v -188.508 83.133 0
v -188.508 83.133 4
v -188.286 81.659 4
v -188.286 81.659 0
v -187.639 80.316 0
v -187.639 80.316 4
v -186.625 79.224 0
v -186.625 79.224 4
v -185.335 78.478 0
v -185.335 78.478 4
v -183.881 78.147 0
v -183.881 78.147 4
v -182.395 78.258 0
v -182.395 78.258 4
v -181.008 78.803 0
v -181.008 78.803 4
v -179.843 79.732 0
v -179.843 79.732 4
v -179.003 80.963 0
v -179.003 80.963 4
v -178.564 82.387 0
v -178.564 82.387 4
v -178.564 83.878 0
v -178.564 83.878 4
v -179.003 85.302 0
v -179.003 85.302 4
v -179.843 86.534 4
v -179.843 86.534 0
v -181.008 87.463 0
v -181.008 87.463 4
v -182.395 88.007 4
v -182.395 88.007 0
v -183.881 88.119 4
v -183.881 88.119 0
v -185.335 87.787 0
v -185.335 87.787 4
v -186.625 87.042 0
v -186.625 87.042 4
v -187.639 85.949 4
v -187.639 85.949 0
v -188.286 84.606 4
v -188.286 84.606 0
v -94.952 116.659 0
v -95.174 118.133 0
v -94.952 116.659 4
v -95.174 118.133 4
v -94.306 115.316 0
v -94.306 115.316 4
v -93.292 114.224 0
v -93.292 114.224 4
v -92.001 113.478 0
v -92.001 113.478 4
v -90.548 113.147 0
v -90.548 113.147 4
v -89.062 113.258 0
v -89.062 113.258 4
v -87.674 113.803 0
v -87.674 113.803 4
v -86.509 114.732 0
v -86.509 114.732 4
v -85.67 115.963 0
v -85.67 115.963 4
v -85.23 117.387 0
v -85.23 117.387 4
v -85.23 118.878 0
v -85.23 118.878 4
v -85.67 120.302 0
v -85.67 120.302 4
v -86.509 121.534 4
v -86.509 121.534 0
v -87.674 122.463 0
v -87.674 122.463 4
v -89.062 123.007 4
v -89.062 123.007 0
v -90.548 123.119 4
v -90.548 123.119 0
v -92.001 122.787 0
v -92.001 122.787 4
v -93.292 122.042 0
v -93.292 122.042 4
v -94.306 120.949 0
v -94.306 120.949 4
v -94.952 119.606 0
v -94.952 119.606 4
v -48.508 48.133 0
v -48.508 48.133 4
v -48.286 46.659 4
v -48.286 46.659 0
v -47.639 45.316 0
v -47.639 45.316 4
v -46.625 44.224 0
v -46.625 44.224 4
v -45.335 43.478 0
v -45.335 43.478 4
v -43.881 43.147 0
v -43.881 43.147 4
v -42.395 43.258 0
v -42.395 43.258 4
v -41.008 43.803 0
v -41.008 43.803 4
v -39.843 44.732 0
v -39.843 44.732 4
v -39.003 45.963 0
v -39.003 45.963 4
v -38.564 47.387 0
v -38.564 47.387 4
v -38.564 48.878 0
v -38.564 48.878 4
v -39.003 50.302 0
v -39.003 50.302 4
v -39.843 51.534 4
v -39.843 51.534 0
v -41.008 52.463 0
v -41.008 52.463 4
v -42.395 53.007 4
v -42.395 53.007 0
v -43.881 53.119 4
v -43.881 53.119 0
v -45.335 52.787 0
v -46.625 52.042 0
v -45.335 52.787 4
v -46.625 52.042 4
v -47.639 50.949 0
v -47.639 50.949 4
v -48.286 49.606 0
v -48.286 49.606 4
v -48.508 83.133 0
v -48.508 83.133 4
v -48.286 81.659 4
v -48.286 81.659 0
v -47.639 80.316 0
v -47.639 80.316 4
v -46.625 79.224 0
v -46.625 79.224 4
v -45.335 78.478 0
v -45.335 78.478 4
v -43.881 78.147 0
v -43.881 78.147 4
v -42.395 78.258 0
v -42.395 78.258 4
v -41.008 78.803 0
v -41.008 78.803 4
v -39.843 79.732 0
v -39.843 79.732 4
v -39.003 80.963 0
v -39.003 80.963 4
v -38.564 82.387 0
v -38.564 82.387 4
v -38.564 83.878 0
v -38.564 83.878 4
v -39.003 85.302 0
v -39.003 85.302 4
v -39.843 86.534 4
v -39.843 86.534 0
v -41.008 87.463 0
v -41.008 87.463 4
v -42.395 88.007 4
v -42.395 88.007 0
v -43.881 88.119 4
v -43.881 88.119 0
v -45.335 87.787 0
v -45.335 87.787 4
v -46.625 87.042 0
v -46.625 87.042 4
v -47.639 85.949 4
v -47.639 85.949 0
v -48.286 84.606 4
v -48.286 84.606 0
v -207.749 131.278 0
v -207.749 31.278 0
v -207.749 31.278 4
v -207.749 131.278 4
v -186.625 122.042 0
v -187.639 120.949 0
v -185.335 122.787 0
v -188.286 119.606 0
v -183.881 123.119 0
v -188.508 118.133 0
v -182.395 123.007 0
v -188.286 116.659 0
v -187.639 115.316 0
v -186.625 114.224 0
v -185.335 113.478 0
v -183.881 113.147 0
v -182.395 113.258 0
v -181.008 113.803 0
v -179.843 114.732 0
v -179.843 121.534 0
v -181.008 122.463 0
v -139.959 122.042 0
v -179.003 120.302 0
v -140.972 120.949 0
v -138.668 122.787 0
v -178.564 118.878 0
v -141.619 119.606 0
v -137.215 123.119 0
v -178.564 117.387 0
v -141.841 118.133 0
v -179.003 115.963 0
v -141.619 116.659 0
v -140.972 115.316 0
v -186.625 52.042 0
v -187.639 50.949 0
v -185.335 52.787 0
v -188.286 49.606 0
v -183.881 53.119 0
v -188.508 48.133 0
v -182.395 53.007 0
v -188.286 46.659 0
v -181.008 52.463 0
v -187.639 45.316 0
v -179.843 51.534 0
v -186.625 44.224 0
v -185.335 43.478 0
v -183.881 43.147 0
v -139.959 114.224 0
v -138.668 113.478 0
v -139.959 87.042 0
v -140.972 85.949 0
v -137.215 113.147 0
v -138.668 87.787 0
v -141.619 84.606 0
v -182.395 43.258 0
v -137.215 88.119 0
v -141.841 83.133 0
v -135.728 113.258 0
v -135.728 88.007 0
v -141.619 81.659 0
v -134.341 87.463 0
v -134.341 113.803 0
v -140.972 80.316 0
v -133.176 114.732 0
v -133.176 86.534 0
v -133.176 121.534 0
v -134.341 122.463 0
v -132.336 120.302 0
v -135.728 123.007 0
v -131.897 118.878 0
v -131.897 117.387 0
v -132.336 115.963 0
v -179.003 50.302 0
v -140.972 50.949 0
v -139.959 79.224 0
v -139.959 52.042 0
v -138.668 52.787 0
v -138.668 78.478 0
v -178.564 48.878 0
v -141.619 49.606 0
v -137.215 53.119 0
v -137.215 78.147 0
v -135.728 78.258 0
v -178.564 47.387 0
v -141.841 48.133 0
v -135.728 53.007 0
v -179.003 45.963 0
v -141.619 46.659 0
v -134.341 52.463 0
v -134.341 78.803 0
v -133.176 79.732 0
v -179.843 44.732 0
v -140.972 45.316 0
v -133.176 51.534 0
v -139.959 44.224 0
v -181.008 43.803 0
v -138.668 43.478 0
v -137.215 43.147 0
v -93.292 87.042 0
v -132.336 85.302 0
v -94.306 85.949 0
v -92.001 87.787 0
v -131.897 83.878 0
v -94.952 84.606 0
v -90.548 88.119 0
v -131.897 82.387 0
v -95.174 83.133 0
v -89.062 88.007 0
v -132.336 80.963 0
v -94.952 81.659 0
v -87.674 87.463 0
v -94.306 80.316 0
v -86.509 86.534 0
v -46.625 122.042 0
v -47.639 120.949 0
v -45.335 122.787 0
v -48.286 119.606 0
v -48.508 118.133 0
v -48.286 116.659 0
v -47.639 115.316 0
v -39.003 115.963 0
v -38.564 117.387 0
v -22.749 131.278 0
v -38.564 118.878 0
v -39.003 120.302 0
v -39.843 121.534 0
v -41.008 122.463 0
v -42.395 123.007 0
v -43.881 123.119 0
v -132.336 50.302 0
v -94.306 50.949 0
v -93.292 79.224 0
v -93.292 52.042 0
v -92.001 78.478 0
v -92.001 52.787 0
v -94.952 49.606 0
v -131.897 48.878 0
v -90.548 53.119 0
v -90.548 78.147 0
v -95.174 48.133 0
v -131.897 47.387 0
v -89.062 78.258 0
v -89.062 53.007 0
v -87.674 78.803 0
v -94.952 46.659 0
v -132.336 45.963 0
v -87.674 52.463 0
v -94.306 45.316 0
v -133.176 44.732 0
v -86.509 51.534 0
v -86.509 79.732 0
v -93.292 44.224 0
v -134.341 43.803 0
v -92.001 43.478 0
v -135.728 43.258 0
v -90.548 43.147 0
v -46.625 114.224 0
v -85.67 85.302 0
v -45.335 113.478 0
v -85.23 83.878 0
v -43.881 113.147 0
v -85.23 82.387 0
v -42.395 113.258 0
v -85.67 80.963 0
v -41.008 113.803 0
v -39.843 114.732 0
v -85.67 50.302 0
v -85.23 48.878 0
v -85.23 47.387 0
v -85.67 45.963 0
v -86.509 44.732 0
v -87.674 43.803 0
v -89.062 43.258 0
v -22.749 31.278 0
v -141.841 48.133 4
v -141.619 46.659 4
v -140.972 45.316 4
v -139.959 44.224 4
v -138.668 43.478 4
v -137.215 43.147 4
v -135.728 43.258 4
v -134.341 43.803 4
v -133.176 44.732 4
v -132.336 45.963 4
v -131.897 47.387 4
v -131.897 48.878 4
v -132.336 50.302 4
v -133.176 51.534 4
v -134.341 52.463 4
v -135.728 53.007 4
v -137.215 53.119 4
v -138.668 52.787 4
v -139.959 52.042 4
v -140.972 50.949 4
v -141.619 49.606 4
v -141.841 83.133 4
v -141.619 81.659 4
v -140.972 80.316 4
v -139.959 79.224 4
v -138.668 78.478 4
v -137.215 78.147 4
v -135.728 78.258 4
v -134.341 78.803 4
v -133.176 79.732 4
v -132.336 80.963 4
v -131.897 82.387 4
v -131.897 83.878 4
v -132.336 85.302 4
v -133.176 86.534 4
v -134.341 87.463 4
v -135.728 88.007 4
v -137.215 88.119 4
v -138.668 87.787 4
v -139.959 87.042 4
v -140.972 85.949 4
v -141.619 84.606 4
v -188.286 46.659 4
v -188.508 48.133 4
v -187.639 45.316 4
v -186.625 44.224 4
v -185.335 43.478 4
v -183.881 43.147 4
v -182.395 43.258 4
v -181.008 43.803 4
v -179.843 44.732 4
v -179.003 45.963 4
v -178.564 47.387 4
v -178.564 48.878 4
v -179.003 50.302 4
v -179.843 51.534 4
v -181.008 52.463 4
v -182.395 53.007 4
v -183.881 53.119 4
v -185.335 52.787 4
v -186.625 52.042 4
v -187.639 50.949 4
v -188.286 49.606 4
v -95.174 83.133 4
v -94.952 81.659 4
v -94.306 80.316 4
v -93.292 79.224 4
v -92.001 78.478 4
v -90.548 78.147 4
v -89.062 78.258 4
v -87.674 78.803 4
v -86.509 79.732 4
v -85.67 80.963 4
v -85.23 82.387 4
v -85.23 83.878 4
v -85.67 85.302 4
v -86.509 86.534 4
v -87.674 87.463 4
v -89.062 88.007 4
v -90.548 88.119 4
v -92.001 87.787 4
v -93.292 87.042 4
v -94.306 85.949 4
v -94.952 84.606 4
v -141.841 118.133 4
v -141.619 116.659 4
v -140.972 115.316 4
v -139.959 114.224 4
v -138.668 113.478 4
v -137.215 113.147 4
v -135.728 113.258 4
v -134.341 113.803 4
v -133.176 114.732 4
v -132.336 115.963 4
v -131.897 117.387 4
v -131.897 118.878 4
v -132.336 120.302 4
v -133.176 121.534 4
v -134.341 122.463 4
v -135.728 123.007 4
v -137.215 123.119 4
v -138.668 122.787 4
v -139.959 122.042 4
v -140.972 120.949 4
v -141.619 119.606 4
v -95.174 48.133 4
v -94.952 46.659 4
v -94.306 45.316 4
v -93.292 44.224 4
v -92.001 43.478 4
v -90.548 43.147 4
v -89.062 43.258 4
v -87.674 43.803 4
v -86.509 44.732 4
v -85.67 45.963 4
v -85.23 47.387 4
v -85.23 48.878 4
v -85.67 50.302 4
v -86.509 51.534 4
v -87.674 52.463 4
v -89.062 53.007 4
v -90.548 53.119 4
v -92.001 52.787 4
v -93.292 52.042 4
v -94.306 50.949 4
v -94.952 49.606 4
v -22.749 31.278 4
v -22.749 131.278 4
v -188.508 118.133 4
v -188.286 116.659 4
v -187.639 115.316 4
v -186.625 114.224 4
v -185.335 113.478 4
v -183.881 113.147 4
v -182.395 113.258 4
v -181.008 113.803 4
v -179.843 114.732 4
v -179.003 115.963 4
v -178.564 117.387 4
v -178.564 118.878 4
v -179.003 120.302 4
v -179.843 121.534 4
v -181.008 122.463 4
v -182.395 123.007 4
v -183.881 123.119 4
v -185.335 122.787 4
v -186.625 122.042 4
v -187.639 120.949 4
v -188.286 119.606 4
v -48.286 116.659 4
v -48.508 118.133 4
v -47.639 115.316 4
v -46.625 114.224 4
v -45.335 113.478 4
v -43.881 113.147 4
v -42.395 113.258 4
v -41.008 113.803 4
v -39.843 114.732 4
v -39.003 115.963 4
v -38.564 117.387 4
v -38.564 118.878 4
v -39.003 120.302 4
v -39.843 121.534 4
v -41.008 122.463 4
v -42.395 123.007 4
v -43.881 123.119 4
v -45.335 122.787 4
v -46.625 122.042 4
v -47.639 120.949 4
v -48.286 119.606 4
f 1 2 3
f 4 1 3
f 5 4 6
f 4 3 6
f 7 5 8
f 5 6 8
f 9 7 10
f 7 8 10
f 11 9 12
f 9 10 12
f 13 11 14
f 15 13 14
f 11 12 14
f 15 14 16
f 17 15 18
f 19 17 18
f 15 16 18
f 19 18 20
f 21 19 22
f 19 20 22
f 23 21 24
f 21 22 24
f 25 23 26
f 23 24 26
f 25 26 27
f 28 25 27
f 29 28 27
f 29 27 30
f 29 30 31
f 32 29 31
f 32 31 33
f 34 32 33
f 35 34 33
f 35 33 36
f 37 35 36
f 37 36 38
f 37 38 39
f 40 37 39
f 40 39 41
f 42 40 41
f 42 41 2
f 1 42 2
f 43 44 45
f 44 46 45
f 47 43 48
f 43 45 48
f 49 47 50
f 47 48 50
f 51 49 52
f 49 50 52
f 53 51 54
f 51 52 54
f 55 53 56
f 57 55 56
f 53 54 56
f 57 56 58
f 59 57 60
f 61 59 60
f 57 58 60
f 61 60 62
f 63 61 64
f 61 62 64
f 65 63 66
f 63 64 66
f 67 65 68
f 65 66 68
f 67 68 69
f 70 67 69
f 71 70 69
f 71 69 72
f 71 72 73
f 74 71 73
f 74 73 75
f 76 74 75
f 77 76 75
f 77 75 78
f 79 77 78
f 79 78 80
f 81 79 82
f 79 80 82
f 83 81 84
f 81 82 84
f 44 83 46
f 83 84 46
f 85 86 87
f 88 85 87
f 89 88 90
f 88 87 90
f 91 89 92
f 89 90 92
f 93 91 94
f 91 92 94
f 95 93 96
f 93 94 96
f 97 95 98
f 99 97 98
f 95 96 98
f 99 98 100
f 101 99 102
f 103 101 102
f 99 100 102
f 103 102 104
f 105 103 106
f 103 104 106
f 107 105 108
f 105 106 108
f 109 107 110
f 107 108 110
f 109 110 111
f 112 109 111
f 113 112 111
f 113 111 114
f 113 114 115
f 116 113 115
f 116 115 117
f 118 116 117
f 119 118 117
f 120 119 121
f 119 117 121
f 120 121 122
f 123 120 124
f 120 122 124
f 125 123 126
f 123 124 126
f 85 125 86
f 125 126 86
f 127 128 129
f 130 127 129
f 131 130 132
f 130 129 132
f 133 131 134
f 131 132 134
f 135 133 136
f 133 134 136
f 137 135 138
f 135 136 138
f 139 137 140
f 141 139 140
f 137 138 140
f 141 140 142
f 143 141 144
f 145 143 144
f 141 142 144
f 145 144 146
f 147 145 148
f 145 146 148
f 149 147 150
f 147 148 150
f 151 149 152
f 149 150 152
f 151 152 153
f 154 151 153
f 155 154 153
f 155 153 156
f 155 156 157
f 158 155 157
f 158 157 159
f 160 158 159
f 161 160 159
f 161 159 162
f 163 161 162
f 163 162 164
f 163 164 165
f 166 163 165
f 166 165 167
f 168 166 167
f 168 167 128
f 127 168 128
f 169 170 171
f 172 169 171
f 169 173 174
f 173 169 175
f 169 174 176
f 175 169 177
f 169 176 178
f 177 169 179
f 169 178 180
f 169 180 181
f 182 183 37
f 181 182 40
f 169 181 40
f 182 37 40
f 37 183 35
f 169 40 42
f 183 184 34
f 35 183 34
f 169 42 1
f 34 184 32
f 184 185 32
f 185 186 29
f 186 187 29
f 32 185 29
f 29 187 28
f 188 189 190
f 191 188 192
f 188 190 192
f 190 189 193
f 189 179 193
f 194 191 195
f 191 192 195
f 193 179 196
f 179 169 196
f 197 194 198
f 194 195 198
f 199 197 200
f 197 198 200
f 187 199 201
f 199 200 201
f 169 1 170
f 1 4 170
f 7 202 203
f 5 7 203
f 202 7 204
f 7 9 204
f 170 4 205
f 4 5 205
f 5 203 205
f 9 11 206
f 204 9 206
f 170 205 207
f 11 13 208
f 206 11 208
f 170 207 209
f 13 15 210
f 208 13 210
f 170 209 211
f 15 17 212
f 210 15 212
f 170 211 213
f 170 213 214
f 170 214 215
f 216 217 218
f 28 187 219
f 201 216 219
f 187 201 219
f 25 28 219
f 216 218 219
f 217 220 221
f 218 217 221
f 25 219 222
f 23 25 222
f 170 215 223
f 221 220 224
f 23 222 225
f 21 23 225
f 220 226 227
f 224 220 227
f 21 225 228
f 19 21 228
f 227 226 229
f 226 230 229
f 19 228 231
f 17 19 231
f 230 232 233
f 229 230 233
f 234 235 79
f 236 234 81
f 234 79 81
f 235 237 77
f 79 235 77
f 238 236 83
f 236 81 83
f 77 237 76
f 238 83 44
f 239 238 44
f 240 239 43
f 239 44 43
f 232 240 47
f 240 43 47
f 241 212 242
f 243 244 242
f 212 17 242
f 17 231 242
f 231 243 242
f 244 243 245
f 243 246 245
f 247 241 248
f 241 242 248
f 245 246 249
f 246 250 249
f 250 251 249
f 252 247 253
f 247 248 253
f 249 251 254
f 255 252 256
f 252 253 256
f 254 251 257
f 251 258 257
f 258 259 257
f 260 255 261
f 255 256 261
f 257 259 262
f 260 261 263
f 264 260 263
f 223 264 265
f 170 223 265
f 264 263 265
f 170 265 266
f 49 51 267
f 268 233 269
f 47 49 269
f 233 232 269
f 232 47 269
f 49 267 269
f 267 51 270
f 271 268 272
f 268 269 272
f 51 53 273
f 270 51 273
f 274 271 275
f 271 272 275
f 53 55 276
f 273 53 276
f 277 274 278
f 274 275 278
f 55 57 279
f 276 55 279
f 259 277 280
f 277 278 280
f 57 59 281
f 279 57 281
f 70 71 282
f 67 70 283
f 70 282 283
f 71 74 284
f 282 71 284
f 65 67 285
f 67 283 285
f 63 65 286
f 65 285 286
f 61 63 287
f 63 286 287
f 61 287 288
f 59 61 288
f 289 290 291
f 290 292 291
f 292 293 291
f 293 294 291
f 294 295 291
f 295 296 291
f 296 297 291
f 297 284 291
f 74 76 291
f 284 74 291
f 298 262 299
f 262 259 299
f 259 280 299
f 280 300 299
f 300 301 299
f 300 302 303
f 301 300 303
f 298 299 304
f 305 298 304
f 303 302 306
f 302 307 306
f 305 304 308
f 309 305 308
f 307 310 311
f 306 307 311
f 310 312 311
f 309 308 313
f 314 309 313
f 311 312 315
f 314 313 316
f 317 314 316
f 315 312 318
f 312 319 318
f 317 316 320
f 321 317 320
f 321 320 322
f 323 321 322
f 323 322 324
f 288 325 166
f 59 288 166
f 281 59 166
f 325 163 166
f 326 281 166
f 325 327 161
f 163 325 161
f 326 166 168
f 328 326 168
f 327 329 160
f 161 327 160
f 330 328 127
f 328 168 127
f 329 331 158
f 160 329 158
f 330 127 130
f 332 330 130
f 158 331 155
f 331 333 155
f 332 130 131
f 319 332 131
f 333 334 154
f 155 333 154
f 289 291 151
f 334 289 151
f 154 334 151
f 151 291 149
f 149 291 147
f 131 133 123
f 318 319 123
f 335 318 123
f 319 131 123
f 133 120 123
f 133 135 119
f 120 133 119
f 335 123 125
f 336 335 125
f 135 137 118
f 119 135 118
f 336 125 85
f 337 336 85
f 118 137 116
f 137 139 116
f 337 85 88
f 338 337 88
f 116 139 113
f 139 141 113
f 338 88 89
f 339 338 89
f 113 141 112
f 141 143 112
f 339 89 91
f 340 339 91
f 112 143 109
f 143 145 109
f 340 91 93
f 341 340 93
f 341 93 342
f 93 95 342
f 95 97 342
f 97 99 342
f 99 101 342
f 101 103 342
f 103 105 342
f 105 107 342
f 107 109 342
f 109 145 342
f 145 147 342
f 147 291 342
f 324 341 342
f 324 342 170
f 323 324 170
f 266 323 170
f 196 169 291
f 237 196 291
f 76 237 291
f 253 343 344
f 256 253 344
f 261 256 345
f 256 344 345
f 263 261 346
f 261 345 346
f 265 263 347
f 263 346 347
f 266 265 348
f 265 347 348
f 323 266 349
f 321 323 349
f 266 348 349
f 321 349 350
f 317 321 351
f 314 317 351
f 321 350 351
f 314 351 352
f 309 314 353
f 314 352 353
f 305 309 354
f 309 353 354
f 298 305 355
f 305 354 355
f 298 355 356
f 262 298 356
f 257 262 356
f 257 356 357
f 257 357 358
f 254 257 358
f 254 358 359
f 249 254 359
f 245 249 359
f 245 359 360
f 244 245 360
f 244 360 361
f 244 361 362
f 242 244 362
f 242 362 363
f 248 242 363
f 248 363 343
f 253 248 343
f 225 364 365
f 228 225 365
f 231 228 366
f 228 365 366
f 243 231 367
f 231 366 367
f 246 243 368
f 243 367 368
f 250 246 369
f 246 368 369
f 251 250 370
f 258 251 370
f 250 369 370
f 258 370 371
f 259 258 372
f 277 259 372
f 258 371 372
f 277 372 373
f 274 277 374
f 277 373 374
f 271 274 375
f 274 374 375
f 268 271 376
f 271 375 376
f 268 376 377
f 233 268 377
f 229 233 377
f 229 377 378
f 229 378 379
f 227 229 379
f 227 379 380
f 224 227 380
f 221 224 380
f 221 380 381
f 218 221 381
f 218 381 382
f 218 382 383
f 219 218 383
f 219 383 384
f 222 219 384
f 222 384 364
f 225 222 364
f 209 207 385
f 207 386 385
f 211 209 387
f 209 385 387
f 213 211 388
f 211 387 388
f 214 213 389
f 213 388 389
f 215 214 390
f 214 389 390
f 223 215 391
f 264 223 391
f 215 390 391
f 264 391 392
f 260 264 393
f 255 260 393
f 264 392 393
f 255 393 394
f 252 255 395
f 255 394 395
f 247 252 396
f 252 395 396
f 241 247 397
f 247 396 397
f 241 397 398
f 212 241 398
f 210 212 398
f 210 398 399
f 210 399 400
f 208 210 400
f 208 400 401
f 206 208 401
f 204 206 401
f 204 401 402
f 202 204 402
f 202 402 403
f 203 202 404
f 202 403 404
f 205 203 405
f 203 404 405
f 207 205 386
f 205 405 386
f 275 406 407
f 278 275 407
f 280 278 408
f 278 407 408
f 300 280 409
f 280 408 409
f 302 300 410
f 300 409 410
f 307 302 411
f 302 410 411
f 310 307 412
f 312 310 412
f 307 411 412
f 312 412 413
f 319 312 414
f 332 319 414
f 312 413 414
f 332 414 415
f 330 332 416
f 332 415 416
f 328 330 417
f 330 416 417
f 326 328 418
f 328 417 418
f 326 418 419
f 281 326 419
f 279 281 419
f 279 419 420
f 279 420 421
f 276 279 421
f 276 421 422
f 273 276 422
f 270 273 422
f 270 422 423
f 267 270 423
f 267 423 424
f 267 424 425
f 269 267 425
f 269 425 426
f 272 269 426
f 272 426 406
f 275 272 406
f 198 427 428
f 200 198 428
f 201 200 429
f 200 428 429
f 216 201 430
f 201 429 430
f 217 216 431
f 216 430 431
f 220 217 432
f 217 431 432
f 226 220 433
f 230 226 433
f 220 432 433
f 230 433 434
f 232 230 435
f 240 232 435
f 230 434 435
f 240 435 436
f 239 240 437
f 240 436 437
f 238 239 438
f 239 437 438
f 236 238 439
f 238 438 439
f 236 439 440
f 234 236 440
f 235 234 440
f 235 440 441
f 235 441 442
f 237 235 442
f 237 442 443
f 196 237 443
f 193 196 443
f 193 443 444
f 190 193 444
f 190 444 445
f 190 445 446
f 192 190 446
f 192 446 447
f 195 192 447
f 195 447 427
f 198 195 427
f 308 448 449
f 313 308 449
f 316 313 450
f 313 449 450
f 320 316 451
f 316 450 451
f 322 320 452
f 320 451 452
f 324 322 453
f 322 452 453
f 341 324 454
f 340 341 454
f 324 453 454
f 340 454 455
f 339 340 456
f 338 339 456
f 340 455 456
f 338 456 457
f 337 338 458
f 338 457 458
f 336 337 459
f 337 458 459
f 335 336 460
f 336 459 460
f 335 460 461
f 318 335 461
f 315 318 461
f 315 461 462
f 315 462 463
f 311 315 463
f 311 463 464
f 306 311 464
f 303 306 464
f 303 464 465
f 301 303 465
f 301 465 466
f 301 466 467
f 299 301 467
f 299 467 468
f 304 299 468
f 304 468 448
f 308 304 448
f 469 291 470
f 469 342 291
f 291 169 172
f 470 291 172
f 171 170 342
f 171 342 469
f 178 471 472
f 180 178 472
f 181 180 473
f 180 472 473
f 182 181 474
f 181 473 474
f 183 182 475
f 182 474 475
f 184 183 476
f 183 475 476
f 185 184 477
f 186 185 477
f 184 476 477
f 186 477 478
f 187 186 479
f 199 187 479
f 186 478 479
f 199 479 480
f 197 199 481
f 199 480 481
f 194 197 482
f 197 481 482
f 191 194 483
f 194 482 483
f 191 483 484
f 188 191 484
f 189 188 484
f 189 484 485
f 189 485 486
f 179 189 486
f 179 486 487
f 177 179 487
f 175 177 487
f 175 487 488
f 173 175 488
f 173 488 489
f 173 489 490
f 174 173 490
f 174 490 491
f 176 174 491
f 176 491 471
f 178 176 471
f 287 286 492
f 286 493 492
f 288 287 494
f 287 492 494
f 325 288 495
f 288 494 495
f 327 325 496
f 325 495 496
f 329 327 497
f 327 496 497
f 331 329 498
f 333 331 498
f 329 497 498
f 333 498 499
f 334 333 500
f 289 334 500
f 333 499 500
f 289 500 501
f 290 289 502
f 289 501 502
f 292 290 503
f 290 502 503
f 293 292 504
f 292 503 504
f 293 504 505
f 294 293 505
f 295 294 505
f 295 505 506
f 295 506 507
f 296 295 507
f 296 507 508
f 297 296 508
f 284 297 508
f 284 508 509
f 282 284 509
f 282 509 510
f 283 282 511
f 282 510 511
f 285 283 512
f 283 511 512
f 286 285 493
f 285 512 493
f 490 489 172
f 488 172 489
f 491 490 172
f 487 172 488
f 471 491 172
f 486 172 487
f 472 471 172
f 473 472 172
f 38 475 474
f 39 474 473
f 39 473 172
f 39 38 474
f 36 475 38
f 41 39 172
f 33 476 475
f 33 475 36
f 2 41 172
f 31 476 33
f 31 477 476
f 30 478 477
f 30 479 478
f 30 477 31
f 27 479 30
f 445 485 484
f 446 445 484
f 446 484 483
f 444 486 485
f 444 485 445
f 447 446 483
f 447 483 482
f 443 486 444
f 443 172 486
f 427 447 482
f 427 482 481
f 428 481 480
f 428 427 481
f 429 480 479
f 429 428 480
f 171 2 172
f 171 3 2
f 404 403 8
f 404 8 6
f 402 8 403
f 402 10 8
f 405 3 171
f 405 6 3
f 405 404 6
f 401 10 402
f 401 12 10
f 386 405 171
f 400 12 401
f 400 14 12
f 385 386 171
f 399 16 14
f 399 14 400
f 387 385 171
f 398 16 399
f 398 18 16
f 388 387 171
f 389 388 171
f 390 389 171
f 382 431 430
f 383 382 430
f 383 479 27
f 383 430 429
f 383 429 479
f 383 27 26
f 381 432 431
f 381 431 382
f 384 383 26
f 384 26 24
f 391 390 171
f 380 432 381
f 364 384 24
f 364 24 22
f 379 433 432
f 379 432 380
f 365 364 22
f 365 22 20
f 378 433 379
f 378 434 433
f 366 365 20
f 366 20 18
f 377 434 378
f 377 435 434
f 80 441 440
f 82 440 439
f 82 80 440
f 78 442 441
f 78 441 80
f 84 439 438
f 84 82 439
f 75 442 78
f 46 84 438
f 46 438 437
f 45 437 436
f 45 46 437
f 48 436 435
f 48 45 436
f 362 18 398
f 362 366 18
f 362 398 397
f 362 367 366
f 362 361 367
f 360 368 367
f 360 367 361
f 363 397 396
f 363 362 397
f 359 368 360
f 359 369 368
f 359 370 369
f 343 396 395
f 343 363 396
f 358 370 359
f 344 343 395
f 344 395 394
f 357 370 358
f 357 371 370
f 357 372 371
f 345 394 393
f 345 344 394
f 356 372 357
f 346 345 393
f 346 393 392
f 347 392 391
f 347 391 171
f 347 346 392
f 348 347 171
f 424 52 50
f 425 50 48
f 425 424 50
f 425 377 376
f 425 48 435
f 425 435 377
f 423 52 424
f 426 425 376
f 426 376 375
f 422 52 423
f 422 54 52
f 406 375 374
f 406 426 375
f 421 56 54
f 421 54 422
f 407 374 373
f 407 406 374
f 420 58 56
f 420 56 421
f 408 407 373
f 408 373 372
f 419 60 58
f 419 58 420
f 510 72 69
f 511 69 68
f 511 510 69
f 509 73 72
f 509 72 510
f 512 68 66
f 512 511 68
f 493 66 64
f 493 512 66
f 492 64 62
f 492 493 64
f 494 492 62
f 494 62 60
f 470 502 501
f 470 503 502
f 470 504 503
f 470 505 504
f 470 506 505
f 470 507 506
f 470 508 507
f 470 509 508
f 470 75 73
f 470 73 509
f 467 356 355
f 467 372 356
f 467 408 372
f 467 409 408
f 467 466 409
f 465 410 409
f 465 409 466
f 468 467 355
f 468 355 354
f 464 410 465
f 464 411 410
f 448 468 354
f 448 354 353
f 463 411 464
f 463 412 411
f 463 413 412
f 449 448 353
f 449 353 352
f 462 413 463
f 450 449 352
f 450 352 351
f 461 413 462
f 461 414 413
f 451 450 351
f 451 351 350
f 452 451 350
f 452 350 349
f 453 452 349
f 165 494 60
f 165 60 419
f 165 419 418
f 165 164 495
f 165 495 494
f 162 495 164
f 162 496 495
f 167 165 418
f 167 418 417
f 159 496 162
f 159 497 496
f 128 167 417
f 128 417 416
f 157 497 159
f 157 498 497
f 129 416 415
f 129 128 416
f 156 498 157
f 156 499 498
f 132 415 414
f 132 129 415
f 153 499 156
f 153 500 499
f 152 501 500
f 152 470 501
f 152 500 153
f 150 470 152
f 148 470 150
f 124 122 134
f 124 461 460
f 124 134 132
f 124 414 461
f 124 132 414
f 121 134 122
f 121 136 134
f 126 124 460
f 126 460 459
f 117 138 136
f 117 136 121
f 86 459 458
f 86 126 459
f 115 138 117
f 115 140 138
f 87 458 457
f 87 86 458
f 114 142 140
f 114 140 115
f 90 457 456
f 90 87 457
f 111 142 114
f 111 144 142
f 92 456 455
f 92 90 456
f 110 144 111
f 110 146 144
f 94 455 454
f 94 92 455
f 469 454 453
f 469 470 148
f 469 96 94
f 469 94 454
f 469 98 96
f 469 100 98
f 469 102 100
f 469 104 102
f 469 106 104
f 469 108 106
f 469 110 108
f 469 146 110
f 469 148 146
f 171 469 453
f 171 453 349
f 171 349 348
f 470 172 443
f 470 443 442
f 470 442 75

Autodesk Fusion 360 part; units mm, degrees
box "BoxPrimitive1" add length 100 width 185 height 4 placed x (0, -1, 0) y (1, 0, 0) z (0, 0, 1) at (-207.7492, 131.2779, 0)
sketch "Sketch2" plane through (0, 0, 4) normal (0, 0, 1) x (-1, 0, 0)
  line L0 (207.7492, -31.2779) -> (22.7492, -31.2779)
  line L1 (22.7492, -31.2779) -> (22.7492, -131.2779)
  line L2 (22.7492, -131.2779) -> (207.7492, -131.2779)
  line L3 (207.7492, -131.2779) -> (207.7492, -31.2779)
  circle A0 centre (43.5078, -48.1327) radius 5
  circle A1 centre (90.1744, -48.1327) radius 5
  circle A2 centre (136.8411, -48.1327) radius 5
  circle A3 centre (183.5078, -48.1327) radius 5
  circle A4 centre (43.5078, -83.1327) radius 5
  circle A5 centre (43.5078, -118.1327) radius 5
  circle A6 centre (90.1744, -83.1327) radius 5
  circle A7 centre (136.8411, -83.1327) radius 5
  circle A8 centre (183.5078, -83.1327) radius 5
  circle A9 centre (90.1744, -118.1327) radius 5
  circle A10 centre (136.8411, -118.1327) radius 5
  circle A11 centre (183.5078, -118.1327) radius 5
  dimension "d7" = 10
  dimension "d10" = 140
  dimension "d11" = 0
  dimension "d14" = 0
  dimension "d15" = -70
  dimension "d18" = 140
  dimension "d19" = 0
  dimension "d22" = 140
  dimension "d23" = 0
extrude "Extrude1" cut sketch "Sketch2" against normal blind 5 contours A0 | A1 | A2 | A3 | A4 | A5 | A6 | A7 | A8 | A9 | A10 | A11
